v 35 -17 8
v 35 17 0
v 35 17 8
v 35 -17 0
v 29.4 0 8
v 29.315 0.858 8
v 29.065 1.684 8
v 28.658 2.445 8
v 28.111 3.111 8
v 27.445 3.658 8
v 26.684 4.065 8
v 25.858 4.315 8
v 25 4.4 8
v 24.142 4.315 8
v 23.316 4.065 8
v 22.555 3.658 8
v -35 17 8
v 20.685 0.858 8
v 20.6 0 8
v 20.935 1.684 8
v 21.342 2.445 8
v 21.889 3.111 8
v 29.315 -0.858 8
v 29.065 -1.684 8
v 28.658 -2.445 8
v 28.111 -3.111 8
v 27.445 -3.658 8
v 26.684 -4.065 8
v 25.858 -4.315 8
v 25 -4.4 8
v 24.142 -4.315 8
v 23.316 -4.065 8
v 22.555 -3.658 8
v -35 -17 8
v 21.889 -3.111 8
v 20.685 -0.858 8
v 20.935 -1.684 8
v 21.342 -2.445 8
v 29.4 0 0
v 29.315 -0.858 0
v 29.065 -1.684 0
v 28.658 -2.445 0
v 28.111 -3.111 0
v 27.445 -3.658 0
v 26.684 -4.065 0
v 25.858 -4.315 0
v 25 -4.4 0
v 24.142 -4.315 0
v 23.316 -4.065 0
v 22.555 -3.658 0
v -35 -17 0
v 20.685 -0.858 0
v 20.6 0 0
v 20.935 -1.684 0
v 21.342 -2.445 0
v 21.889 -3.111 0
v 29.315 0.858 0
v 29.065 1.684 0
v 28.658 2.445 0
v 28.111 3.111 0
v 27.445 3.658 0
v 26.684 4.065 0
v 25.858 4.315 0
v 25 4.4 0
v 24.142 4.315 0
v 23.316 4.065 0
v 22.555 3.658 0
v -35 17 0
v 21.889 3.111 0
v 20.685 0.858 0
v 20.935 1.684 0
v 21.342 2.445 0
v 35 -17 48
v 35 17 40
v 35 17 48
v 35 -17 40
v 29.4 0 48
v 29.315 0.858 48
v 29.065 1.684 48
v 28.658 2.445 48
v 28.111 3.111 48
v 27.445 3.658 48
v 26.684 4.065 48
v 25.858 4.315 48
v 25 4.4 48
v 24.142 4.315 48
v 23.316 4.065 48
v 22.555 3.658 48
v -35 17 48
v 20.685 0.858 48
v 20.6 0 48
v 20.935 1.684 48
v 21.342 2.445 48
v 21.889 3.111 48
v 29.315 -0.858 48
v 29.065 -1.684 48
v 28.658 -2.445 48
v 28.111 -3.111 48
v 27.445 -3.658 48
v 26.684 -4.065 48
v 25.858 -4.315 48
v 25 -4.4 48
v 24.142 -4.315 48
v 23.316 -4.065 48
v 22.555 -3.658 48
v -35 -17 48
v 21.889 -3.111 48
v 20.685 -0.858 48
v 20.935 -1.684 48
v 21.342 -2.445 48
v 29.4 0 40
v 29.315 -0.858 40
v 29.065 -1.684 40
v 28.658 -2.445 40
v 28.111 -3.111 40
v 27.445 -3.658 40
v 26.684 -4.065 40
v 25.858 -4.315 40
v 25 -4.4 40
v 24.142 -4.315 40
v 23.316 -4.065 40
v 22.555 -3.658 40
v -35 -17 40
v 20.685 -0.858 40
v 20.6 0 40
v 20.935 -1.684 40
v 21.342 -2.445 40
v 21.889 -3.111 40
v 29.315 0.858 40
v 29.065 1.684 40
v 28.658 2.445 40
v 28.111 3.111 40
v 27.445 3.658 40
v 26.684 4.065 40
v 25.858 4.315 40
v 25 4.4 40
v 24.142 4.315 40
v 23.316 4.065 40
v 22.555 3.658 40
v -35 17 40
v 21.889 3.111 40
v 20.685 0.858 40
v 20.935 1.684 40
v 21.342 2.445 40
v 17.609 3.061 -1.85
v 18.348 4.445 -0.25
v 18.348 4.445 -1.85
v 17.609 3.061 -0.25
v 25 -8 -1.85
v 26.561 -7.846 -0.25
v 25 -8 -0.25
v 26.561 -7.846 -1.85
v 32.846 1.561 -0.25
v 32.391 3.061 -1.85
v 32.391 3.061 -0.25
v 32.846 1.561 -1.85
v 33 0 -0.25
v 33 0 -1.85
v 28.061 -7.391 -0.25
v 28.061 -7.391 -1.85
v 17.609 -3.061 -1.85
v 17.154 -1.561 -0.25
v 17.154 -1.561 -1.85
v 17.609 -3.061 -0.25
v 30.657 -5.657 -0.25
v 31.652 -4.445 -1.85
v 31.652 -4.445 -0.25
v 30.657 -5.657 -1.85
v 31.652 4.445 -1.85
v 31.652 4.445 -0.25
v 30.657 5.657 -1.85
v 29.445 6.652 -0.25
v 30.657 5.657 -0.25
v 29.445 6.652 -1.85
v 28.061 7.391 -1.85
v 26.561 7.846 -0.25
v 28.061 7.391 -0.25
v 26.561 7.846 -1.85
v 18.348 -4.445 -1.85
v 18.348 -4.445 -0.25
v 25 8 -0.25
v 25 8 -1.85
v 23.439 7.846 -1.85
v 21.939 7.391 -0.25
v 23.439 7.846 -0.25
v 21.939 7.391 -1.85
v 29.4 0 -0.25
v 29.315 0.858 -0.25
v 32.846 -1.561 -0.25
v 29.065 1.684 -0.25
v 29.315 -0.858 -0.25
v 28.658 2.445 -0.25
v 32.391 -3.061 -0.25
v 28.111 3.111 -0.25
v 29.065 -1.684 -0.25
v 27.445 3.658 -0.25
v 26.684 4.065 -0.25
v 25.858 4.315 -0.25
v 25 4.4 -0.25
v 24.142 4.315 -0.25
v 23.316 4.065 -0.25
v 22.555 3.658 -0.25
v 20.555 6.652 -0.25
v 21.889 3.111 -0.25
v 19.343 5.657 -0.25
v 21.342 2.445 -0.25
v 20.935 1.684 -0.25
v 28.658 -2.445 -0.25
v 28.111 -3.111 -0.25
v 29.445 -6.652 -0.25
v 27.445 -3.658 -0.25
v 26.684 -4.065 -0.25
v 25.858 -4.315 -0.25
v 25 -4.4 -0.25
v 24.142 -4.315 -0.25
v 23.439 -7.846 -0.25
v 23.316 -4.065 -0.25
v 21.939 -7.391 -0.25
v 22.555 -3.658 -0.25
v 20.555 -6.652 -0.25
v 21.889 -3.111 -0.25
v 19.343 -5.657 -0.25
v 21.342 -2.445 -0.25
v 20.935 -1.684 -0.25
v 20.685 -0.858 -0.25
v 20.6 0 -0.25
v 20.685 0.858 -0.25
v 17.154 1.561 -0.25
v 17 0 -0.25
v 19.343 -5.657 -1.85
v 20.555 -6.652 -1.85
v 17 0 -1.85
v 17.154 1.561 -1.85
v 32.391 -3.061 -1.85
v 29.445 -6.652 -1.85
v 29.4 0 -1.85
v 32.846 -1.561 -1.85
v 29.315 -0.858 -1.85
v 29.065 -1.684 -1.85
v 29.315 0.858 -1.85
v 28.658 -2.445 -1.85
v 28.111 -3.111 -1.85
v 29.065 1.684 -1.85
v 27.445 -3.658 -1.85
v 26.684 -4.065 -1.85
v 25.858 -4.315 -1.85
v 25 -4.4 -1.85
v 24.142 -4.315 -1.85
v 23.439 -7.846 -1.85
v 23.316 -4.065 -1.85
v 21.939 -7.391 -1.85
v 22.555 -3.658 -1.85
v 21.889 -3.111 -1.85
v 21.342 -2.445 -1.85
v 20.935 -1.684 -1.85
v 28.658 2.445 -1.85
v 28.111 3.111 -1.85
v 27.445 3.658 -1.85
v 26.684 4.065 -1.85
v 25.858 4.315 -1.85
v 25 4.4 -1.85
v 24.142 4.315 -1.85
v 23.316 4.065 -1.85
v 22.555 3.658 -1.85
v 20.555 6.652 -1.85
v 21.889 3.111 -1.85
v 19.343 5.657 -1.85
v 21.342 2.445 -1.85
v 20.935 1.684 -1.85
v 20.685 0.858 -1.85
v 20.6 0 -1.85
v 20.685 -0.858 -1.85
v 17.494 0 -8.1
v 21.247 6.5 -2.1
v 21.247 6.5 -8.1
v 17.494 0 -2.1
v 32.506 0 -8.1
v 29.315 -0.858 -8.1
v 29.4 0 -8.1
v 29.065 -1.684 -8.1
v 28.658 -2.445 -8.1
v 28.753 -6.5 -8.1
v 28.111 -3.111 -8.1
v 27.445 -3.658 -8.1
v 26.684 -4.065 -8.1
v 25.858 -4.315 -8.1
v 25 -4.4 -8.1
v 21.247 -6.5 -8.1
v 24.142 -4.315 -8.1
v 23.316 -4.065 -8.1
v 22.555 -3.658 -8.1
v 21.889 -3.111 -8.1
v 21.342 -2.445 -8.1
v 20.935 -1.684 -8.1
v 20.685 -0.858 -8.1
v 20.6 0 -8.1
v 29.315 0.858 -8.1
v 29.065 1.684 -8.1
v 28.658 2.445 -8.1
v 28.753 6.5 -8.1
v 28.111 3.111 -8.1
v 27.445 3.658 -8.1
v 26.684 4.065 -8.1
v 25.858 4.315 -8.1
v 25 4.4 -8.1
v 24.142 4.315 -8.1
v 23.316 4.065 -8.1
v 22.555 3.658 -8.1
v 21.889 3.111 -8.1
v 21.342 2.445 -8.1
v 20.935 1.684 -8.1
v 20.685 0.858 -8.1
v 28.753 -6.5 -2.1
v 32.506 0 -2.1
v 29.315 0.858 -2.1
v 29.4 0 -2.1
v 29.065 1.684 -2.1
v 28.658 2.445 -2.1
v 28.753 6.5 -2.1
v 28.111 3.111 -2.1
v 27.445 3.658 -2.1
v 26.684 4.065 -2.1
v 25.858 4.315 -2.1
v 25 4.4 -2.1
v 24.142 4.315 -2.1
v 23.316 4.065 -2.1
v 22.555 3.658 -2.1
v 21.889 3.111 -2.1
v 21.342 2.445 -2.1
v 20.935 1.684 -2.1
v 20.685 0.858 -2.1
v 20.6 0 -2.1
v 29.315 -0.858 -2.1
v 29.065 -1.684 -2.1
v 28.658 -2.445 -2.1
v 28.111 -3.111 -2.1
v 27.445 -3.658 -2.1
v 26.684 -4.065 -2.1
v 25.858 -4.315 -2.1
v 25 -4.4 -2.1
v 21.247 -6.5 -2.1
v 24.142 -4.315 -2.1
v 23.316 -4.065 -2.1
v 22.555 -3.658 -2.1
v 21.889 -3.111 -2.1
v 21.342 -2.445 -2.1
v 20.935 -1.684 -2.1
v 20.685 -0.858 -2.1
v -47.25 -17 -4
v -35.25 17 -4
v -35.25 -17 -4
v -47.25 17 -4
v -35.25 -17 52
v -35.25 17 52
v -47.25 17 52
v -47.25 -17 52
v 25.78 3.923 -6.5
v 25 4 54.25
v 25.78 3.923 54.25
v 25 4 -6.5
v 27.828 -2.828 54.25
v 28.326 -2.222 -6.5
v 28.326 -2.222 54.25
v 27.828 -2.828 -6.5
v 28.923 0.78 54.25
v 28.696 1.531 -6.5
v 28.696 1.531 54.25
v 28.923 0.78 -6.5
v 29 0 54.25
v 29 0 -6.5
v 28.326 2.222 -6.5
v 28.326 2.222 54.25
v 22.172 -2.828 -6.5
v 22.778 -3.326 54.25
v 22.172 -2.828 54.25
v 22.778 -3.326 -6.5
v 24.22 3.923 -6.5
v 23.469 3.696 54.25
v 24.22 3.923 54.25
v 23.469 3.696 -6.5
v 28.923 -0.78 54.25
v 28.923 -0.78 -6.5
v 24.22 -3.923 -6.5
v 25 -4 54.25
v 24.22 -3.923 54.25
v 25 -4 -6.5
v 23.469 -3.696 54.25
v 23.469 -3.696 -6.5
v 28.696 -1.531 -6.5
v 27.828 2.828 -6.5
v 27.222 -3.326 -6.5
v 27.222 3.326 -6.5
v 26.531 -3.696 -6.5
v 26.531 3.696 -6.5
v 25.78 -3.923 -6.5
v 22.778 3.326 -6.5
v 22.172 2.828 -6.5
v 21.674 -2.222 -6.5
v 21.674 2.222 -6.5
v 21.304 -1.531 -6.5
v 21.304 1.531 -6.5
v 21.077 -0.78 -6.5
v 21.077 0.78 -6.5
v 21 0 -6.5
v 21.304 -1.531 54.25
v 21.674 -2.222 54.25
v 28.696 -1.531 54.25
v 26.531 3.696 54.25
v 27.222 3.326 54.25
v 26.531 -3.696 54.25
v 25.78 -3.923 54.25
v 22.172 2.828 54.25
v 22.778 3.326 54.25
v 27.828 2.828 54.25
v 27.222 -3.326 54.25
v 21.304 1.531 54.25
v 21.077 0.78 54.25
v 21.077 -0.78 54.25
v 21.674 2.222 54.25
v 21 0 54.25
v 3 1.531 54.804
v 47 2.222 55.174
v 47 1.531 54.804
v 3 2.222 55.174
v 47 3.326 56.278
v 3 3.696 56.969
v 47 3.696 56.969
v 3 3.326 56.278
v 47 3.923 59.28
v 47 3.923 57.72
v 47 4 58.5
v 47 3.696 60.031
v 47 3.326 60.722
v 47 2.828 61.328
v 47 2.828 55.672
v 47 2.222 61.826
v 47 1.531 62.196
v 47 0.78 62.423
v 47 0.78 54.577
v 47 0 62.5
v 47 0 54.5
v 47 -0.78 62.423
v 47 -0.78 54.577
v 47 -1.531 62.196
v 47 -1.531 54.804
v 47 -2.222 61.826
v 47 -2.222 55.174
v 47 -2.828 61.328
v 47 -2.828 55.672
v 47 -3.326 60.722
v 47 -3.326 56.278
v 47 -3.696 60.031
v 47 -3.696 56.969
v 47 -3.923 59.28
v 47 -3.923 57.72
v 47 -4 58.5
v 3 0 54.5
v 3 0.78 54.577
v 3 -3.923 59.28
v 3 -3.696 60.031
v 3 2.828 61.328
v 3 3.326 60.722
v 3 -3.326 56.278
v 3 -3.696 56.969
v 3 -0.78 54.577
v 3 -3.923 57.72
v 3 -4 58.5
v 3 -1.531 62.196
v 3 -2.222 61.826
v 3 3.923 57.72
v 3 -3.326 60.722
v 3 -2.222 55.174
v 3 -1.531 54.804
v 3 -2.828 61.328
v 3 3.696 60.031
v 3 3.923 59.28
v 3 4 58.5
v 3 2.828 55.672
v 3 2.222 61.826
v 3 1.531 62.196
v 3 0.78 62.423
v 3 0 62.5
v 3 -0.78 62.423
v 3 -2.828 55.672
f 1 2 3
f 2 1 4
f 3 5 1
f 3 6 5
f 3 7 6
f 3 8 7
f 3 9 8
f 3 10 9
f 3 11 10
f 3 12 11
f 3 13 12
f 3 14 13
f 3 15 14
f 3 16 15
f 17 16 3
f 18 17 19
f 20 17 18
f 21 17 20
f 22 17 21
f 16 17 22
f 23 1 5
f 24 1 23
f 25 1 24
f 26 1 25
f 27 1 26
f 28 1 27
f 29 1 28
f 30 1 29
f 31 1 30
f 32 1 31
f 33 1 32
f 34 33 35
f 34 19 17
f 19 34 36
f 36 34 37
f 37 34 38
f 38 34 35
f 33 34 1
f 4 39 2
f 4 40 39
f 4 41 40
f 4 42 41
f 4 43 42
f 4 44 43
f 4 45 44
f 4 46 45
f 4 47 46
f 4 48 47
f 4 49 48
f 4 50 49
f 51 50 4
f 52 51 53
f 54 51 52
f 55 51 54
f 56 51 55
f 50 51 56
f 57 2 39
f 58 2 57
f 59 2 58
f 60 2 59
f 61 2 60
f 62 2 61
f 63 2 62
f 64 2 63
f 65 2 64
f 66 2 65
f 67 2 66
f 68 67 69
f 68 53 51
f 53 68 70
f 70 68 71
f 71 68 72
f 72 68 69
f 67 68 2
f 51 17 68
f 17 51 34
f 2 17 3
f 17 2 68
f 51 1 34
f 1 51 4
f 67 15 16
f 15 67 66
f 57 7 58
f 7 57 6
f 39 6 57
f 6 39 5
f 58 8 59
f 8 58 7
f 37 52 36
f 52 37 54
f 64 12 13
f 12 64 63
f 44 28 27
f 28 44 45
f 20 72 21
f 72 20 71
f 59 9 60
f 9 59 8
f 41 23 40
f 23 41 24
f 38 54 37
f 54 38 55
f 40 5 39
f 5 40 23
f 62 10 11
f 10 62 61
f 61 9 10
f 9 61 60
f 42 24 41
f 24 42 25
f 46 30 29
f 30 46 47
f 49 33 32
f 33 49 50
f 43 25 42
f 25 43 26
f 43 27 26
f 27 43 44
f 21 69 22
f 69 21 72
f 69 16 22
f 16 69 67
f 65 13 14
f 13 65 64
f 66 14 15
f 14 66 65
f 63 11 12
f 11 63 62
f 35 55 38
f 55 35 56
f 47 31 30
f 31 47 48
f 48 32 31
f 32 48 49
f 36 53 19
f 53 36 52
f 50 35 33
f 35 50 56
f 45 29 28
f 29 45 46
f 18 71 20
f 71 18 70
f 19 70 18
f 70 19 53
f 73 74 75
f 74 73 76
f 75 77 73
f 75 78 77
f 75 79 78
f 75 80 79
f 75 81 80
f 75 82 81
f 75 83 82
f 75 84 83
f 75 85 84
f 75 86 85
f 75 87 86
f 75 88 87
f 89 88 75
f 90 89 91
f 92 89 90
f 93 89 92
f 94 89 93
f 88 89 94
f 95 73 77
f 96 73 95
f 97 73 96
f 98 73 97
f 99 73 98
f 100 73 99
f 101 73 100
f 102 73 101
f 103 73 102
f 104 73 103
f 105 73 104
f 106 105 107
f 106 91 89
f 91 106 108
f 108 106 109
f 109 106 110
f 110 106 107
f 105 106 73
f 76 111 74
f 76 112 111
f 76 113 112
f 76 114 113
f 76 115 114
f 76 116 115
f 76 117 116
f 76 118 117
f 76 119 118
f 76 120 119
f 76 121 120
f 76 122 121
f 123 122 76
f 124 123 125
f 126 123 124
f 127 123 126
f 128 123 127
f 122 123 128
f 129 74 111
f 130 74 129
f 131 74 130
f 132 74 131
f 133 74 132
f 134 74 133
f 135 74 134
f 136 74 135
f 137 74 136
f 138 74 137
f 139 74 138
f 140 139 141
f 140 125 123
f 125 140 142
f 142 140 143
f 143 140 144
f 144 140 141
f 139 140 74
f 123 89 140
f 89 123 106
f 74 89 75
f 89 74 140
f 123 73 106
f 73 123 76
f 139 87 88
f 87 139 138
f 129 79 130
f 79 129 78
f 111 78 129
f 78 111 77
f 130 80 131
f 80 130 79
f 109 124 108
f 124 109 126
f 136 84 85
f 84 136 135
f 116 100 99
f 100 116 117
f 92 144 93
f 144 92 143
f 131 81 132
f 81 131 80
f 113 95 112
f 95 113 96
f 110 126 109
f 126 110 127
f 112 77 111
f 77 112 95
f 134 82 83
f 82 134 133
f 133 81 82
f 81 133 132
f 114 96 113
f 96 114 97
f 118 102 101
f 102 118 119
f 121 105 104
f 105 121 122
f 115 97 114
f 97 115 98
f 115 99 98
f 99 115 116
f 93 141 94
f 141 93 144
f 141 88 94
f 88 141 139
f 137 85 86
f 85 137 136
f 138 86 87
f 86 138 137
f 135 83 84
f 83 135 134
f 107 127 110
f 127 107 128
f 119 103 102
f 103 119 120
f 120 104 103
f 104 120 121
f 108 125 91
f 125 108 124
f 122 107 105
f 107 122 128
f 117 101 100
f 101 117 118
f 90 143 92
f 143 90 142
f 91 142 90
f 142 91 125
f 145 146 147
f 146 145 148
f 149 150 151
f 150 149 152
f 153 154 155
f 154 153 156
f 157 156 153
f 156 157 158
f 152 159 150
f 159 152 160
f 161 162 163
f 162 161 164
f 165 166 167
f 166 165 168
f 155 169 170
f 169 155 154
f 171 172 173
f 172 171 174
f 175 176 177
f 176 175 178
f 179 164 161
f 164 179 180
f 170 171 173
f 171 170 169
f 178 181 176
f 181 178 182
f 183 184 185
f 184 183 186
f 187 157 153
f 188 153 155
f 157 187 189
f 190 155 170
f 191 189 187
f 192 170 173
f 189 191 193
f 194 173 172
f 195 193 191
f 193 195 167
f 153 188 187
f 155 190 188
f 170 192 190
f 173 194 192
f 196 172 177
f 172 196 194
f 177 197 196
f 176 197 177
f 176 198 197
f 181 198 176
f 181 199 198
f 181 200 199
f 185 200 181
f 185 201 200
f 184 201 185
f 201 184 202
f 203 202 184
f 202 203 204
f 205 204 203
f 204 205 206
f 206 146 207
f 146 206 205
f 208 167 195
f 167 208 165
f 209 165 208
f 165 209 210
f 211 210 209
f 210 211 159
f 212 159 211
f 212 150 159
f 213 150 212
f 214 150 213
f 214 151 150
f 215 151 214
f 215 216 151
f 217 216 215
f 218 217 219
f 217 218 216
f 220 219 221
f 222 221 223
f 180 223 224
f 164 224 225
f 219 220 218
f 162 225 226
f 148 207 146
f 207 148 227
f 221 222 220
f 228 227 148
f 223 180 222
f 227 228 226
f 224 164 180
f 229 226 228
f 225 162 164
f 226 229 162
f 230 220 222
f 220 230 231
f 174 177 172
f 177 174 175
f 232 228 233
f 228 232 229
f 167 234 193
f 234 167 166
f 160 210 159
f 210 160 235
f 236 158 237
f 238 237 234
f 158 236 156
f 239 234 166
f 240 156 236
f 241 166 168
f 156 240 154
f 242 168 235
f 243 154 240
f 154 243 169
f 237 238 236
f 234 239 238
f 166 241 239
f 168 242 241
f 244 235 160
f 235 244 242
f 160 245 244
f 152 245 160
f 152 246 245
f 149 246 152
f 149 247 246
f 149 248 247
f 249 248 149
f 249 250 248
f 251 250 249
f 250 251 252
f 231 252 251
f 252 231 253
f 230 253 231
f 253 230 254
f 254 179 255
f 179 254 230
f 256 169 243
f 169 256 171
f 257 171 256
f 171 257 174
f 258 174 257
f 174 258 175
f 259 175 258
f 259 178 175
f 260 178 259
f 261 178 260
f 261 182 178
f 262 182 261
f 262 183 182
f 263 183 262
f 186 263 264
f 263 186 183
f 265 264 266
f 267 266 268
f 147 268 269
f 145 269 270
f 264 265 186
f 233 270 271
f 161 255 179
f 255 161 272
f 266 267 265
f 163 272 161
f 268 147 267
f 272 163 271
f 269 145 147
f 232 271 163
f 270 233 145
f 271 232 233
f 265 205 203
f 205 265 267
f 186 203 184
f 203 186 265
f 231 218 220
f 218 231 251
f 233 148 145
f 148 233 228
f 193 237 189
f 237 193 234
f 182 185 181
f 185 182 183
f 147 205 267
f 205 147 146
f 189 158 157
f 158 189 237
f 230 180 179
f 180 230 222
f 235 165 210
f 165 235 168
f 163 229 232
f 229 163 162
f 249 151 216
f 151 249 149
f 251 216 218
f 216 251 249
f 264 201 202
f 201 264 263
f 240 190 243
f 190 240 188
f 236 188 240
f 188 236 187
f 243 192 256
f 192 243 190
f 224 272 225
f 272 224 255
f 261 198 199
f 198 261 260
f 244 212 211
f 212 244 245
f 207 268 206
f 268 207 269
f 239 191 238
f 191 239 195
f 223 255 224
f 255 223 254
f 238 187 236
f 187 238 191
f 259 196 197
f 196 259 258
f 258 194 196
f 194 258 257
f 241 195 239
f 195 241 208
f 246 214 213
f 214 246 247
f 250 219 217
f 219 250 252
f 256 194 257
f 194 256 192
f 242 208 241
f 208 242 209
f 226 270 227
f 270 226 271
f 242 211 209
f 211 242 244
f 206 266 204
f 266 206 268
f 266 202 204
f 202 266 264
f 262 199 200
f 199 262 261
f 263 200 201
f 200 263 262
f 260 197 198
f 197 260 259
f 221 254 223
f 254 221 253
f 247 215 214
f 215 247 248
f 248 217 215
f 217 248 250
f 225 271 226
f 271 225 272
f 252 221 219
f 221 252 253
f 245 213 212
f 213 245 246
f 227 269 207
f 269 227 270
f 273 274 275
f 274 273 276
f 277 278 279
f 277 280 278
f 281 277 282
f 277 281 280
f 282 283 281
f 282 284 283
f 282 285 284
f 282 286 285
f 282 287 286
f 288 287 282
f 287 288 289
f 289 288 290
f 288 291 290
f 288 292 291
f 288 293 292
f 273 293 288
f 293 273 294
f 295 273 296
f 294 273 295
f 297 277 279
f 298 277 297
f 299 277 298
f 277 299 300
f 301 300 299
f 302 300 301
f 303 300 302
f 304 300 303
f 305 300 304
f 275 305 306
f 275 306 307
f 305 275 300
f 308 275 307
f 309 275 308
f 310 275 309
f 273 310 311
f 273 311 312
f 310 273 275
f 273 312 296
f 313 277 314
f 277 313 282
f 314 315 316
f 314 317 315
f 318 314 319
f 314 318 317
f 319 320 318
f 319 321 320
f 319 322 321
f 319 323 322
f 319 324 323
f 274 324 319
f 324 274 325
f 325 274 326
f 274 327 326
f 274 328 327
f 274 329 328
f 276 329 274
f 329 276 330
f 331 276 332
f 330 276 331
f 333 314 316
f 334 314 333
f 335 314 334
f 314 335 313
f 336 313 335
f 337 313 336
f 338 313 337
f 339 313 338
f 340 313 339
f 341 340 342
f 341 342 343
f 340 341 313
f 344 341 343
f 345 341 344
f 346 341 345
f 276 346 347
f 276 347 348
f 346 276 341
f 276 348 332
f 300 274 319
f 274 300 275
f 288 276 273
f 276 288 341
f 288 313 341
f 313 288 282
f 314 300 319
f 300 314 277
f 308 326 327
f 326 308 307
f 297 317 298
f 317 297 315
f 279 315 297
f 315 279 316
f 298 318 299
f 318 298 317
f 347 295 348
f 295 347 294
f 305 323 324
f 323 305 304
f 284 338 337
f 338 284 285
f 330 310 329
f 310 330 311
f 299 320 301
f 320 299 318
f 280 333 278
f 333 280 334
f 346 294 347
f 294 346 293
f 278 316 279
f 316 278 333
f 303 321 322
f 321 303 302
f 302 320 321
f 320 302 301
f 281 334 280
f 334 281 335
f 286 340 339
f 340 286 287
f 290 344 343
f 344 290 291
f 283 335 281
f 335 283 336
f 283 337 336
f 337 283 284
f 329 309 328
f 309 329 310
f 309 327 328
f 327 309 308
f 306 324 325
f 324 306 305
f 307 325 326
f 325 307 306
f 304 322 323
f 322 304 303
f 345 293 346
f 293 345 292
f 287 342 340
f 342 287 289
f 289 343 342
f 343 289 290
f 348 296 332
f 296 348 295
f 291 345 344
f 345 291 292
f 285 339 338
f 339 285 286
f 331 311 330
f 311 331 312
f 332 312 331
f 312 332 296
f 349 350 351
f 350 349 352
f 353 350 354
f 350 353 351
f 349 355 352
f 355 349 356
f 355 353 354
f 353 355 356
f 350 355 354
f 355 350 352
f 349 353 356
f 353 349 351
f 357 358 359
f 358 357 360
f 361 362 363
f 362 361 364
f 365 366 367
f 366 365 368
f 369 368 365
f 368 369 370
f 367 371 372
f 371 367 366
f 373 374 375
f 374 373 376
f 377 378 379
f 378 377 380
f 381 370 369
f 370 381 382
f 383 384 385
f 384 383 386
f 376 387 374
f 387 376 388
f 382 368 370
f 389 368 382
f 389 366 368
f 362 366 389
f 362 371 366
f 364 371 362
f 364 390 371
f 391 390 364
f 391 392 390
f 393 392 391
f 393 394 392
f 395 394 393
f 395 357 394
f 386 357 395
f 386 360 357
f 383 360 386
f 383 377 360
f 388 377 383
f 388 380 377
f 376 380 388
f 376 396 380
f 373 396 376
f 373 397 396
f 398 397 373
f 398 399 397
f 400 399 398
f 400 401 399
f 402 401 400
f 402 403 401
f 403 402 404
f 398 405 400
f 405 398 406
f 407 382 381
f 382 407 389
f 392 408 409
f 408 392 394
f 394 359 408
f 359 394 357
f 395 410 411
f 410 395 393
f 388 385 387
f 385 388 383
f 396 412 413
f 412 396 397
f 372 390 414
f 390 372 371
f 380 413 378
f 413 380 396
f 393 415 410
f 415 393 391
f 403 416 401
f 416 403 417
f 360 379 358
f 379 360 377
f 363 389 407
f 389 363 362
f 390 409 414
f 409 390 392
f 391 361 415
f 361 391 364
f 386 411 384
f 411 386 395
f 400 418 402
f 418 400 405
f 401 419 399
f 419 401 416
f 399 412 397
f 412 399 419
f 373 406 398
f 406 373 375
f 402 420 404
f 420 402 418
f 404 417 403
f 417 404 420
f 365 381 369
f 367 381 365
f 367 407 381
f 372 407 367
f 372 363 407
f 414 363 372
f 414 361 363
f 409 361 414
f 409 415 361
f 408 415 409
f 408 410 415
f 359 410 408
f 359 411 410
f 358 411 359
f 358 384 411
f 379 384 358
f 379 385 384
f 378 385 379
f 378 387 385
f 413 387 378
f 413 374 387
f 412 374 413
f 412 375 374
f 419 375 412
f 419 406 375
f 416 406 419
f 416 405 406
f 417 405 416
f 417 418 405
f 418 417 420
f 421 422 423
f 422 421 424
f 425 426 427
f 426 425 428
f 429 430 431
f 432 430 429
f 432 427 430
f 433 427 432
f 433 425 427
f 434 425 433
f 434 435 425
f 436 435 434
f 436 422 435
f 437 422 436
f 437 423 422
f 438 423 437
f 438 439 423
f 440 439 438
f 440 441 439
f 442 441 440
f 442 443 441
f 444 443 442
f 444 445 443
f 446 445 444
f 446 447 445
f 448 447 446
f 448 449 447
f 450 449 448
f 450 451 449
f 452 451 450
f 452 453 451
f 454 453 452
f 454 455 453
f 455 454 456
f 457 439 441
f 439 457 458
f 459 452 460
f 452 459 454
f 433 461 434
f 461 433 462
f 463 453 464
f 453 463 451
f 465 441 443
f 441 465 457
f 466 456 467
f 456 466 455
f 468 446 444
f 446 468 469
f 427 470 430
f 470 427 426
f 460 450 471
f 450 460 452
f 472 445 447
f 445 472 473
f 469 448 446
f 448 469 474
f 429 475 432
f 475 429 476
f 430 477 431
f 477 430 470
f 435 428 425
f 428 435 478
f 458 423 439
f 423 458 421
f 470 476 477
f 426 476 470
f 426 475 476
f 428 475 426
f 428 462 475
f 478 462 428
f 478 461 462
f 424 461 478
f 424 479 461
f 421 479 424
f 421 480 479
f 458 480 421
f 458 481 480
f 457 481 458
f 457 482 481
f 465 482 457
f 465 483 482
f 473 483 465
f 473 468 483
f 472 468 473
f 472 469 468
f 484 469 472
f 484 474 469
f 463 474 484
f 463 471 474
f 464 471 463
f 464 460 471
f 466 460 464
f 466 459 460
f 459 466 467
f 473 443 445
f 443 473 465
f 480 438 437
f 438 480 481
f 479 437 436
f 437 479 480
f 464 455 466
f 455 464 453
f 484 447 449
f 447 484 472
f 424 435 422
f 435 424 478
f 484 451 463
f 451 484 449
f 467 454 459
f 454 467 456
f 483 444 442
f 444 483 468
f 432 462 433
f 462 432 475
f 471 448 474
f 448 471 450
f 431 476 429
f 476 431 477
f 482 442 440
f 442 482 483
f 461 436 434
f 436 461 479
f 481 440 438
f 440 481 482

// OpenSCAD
$fn = 32;

// ------------------------------------------------------------------------
// C clamp: throat 40 mm, screw d8
// Every part is its own module, assembly() places every instance.
// ------------------------------------------------------------------------

// --- part 1 ---
module clamp_arm() {
  difference() {
    translate([-35, -17, 0]) cube([70, 34, 8]);
    translate([25, 0, -1]) cylinder(h = 10, d = 8.8);
  }
}

// --- part 2 ---
module clamp_spine() {
  difference() {
    translate([-28, -17, 0]) cube([56, 34, 12]);
  }
}

// --- part 3 ---
module clamp_screw() {
  translate([0, 0, -30.375]) cylinder(h = 60.75, d = 8);
}

// --- part 4 ---
module clamp_washer() {
  difference() {
      translate([0, 0, 0]) cylinder(h = 1.6, d = 16);
      translate([0, 0, -1]) cylinder(h = 3.6, d = 8.8);
    }
}

// --- part 5 ---
module clamp_nut() {
  difference() {
    linear_extrude(height = 6) polygon(points = [[7.506, 0], [3.753, 6.5], [-3.753, 6.5], [-7.506, 0], [-3.753, -6.5], [3.753, -6.5]]);
    translate([0, 0, -1]) cylinder(h = 8, d = 8.8);
  }
}

// --- part 6 ---
module tommy_bar() {
  translate([0, 0, -22]) cylinder(h = 44, d = 8);
}

// --- assembly ---
module assembly() {
  color([0.80, 0.24, 0.20]) translate([0, 0, 0]) rotate([0, 0, 0]) clamp_arm();
  color([0.20, 0.45, 0.75]) translate([0, 0, 40]) rotate([0, 0, 0]) clamp_arm();
  color([0.25, 0.62, 0.32]) translate([-47.25, 0, 24]) rotate([0, 90, 0]) clamp_spine();
  color([0.92, 0.70, 0.18]) translate([25, 0, 23.875]) rotate([0, 0, 0]) clamp_screw();
  color([0.58, 0.35, 0.70]) translate([25, 0, -1.85]) rotate([0, 0, 0]) clamp_washer();
  color([0.16, 0.66, 0.66]) translate([25, 0, -8.1]) rotate([0, 0, 0]) clamp_nut();
  color([0.85, 0.48, 0.18]) translate([25, 0, 58.5]) rotate([0, 90, 0]) tommy_bar();
}

assembly();
